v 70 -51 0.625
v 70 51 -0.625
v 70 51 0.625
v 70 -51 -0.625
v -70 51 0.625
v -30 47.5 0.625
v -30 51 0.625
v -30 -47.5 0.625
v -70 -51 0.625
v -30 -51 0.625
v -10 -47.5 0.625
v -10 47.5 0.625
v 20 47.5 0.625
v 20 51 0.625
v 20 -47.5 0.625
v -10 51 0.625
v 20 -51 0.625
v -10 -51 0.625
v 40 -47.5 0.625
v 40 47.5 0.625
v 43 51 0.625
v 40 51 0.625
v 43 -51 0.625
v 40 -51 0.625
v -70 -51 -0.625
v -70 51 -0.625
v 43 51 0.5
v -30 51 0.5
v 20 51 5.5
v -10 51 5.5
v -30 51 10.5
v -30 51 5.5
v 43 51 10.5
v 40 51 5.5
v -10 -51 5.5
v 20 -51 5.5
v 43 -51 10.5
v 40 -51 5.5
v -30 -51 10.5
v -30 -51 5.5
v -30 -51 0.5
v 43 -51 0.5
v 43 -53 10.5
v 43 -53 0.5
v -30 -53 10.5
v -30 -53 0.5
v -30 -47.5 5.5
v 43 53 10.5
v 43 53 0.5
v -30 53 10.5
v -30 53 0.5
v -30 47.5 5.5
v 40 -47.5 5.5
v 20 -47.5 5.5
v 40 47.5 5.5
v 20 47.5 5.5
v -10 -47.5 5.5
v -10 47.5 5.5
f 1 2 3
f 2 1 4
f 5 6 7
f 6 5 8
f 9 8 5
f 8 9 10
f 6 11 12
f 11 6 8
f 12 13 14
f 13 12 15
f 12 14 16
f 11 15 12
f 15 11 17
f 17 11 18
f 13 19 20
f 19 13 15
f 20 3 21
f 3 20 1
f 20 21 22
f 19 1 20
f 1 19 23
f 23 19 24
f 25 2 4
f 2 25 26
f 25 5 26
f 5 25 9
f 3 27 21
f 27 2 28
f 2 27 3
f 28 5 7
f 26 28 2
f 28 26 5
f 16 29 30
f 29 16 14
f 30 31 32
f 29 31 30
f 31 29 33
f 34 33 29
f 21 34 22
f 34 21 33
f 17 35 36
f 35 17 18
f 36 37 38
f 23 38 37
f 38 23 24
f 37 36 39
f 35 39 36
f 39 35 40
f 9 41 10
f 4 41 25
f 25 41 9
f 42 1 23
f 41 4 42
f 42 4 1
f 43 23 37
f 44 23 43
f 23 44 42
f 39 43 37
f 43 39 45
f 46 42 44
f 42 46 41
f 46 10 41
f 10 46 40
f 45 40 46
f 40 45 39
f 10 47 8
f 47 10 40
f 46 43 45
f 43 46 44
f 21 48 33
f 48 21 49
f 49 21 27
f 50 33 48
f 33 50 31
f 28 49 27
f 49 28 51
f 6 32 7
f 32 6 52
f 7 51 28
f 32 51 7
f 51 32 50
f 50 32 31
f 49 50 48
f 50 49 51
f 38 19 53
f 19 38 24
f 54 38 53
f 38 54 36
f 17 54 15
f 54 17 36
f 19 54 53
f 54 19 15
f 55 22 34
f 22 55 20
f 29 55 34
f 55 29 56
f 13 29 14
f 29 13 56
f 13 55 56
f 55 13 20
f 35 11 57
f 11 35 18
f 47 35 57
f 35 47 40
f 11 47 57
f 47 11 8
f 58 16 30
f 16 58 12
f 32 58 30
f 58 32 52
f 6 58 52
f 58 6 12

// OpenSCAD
module mainTray(){
	//tray
	color([0.4,0.8,0]) cube(size=[140,102,1.25],center=true);
	//walls
	translate([6.5,-52,5.5]){
		color([0.4,0.8,0]) cube(size=[73,2,10],center=true);
	}
	translate([6.5,52,5.5]){
		color([0.4,0.8,0]) cube(size=[73,2,10],center=true);
	}
	//wallSupports
	translate([30,-50,3]){
		color([0.4,0.8,0]) cube(size=[20,5,5],center=true);
	}
	translate([30,50,3]){
		color([0.4,0.8,0]) cube(size=[20,5,5],center=true);
	}
	translate([-20,-50,3]){
		color([0.4,0.8,0]) cube(size=[20,5,5],center=true);
	}
	translate([-20,50,3]){
		color([0.4,0.8,0]) cube(size=[20,5,5],center=true);
	}
}

mainTray();
